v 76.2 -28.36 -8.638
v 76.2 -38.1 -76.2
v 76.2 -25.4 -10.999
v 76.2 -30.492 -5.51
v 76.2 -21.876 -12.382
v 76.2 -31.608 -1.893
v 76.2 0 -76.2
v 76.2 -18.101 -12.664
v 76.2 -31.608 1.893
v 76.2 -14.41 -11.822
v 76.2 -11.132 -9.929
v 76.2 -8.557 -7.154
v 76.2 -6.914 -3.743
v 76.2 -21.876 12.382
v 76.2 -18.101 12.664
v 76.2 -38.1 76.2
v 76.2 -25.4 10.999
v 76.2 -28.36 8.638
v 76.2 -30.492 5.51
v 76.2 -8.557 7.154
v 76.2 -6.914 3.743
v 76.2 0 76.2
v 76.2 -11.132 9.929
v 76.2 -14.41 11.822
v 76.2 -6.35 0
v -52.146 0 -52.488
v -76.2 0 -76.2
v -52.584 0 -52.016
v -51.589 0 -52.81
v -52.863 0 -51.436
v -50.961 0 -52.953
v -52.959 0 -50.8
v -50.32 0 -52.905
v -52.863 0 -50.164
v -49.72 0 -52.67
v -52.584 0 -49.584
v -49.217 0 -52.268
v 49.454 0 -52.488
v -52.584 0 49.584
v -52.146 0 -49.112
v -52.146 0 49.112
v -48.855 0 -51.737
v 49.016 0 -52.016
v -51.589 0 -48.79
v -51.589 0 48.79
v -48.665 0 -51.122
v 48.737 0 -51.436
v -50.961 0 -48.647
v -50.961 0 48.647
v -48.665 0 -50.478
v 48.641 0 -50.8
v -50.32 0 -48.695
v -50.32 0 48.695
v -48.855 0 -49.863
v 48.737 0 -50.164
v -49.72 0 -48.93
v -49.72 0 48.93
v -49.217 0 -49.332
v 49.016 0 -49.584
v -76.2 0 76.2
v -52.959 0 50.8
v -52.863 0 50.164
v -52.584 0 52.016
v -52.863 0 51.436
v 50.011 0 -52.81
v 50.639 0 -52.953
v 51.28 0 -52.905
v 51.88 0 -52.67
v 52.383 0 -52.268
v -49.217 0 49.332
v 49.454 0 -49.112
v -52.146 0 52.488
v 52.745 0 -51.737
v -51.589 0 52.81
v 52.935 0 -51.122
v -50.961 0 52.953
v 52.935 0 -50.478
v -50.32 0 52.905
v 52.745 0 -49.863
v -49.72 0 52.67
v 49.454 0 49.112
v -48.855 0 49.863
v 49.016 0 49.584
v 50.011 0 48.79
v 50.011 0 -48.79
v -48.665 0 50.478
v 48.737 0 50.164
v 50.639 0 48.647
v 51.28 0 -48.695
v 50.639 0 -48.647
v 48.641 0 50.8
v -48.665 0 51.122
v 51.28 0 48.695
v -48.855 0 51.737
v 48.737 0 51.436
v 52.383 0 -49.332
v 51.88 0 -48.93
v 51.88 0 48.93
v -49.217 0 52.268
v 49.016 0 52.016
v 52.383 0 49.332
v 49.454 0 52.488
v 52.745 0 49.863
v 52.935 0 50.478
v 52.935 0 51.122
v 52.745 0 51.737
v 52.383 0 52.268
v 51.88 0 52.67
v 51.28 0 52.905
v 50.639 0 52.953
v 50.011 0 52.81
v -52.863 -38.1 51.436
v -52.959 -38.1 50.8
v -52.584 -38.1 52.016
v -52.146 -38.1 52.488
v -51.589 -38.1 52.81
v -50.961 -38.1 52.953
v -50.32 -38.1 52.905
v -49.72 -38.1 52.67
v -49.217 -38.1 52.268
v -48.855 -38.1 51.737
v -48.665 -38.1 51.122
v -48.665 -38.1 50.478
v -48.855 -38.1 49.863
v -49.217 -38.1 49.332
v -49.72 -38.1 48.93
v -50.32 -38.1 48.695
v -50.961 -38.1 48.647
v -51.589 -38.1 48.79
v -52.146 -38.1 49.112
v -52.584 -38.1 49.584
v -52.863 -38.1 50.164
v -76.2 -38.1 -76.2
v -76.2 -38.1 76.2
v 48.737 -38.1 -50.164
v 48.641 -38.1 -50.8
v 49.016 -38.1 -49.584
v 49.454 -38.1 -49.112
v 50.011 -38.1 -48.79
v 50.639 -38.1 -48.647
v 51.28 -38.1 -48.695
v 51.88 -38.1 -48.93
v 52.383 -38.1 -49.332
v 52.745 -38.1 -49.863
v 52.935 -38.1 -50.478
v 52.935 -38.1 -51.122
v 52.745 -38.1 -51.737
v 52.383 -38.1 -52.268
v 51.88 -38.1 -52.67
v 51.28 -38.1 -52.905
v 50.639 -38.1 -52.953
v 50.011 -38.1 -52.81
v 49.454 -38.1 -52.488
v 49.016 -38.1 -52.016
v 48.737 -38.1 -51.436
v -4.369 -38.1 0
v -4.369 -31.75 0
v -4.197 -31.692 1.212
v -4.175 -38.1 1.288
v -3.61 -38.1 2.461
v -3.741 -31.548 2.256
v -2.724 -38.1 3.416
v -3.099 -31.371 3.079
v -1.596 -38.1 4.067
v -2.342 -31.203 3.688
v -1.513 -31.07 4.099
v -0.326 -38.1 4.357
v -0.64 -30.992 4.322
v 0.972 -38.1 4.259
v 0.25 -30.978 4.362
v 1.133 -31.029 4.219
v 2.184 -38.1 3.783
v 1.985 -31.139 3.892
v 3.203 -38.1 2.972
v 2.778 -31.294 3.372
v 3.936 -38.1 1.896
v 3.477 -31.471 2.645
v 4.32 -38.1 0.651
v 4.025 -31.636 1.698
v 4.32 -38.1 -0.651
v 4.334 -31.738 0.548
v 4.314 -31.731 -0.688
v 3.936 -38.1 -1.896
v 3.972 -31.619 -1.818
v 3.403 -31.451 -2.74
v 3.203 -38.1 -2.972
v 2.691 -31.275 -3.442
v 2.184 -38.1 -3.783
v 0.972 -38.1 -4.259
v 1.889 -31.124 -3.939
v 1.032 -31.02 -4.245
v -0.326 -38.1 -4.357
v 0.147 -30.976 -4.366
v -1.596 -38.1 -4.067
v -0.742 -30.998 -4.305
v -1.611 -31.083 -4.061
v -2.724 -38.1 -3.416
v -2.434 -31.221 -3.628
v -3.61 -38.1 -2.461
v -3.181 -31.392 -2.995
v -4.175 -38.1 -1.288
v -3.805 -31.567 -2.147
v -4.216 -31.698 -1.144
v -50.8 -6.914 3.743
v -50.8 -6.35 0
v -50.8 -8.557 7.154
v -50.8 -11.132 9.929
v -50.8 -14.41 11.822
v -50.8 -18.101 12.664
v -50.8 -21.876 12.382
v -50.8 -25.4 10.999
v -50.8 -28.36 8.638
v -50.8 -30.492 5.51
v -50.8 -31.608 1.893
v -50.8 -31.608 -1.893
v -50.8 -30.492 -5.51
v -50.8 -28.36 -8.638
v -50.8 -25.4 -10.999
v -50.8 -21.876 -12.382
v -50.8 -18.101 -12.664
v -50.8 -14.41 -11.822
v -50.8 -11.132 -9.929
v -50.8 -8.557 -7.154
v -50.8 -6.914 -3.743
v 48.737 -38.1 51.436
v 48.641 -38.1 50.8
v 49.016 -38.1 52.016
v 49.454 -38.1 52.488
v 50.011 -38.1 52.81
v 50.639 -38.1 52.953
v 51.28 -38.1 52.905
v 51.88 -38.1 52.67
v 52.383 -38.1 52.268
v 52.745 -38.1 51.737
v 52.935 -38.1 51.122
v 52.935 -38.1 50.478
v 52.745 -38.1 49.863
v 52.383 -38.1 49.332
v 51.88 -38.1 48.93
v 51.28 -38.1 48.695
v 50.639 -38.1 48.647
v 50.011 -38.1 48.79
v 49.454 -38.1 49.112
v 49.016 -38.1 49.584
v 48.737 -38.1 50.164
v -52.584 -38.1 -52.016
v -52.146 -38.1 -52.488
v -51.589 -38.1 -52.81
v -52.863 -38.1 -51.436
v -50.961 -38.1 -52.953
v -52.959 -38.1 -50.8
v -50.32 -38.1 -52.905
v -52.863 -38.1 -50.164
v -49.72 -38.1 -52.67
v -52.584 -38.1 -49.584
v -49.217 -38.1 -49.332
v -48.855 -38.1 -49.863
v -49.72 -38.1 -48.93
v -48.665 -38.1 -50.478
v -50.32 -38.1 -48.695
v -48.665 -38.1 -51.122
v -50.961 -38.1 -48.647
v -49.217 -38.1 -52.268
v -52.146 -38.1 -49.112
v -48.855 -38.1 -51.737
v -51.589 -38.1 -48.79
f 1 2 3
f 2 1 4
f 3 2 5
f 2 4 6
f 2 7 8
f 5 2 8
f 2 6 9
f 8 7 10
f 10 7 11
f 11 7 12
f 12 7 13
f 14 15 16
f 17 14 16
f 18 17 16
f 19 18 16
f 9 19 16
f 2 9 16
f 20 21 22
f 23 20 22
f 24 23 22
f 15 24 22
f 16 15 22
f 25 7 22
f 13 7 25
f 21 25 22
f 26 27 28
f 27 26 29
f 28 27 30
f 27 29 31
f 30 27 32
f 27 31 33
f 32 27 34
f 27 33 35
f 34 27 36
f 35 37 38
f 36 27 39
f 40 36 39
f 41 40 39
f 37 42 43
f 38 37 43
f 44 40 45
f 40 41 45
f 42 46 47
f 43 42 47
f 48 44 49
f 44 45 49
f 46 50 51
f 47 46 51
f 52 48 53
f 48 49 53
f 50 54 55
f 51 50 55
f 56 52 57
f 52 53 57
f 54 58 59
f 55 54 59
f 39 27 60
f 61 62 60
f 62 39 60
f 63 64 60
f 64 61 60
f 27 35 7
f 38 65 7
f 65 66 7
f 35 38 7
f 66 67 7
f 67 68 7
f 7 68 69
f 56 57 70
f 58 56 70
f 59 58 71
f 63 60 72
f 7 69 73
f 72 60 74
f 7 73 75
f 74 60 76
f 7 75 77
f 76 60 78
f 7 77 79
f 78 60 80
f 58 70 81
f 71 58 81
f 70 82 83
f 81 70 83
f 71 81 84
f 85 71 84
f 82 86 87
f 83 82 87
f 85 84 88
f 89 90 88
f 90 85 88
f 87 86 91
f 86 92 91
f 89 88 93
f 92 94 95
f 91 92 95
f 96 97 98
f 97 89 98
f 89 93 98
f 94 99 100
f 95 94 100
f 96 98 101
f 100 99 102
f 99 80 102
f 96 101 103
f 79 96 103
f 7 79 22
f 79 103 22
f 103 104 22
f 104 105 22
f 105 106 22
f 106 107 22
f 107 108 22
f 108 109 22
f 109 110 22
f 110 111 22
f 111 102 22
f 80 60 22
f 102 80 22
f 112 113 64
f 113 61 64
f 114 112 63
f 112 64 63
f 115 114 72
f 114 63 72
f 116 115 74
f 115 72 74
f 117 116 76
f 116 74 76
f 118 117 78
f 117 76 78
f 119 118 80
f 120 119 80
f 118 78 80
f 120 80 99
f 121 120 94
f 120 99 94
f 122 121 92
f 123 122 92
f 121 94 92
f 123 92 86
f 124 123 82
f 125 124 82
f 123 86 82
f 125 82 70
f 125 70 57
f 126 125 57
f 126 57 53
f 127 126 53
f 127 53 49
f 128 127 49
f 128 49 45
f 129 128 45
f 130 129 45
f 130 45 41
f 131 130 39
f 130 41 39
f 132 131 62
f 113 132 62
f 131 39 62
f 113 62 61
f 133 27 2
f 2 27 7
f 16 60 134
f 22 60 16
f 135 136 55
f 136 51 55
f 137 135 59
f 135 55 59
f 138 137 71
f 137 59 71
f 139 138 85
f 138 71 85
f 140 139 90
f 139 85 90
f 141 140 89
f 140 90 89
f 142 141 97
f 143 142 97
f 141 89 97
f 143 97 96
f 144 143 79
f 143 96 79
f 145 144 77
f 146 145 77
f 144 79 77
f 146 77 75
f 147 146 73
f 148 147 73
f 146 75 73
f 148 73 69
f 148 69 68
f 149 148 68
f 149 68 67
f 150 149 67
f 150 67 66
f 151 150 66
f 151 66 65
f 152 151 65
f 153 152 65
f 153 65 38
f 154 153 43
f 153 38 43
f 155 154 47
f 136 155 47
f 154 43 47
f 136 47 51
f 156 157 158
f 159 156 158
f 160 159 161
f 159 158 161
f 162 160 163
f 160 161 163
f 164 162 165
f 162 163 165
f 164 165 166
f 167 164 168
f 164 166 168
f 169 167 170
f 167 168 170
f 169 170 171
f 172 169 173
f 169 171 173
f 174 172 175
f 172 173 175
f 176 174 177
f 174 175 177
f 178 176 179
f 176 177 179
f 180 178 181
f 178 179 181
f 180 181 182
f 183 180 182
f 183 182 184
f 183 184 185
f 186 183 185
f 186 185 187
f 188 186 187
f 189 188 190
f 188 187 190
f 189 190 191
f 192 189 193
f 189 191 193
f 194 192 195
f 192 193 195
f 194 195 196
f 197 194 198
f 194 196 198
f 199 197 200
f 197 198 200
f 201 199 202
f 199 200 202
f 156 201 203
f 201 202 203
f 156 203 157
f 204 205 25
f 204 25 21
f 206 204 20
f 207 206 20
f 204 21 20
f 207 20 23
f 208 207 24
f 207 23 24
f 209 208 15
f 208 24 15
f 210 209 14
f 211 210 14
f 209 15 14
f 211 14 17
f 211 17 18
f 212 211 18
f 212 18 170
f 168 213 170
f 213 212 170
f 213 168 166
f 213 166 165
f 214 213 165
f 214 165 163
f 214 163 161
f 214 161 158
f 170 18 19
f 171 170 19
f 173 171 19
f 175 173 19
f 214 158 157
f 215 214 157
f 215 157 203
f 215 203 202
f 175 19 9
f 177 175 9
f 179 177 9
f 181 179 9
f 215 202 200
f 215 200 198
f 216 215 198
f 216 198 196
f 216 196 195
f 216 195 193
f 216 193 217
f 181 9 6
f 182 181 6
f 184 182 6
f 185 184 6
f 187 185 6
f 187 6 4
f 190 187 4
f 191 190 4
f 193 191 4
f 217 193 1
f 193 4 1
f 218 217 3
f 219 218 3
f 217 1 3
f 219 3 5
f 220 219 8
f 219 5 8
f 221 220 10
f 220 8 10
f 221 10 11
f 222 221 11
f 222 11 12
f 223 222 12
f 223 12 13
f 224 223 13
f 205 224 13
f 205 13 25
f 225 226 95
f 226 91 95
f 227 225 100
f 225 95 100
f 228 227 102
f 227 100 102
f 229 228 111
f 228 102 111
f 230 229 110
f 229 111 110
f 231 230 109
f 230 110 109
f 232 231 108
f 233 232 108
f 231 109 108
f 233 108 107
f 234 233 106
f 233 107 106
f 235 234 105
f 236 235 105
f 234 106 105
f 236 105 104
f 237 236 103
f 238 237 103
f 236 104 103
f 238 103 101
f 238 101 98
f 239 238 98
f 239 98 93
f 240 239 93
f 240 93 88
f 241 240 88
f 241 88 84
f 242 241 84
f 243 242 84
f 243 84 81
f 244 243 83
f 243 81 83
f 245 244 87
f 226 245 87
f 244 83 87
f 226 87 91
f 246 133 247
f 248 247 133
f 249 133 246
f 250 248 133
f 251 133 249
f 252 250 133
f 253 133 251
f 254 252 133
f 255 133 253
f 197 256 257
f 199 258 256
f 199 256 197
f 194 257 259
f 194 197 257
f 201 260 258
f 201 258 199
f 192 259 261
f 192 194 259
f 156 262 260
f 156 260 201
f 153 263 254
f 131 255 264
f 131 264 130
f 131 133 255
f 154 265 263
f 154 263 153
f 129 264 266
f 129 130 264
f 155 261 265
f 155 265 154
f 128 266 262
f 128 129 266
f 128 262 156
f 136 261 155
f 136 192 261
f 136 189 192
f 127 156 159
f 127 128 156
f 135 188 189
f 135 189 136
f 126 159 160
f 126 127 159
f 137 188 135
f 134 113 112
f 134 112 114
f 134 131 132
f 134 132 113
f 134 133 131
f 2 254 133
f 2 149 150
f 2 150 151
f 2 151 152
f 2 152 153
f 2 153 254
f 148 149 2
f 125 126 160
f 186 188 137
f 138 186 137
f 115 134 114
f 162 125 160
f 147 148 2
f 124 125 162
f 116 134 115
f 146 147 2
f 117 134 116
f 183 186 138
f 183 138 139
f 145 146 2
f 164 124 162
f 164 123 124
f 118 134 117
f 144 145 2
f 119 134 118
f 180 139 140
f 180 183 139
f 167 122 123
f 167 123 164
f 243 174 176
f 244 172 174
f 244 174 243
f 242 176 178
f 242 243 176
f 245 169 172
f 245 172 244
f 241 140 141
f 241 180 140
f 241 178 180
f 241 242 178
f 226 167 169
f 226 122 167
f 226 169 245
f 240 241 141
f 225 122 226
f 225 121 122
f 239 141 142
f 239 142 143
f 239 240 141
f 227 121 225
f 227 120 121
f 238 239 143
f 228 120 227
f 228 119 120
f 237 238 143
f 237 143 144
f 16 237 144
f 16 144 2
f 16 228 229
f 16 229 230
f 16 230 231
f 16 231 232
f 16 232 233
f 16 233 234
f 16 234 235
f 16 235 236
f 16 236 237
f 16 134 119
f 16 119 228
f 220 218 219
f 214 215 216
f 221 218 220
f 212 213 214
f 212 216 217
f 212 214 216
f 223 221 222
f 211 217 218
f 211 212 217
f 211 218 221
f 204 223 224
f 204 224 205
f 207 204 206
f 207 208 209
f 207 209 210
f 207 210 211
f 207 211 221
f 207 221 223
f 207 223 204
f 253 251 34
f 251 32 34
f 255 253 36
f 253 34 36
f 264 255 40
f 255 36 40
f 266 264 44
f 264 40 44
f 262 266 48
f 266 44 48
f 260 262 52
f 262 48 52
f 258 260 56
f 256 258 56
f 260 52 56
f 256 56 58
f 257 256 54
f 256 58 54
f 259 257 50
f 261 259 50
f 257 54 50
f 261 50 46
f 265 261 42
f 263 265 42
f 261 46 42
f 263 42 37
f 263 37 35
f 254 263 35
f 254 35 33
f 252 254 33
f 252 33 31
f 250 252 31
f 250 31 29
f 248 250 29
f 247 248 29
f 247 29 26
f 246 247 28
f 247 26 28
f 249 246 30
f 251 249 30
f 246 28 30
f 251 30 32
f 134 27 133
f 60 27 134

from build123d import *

# Parameters (mm, degrees)
F0_W     = 152.4
F0_H     = 152.4
F1_DEPTH = 38.1
F4_D     = 8.7376
F4_DEPTH = 12.7
F4_TIP   = 2.6250398724
F2_R     = 12.7
F5_DEPTH = 127
F7_D     = 4.318
F7_DEPTH = 38.1
F7_TIP   = 1.2972580765


with BuildPart() as f1:
    # F0 (on Front) → F1 (new body)
    with BuildSketch(Plane.XZ):
        Rectangle(F0_W, F0_H)
    extrude(amount=F1_DEPTH)

    # F4
    with Locations(Plane.XZ.offset(38.1)):
        with Locations((0, 0)):
            Hole(F4_D / 2, depth=F4_DEPTH)
            with Locations((0, 0, -(F4_DEPTH + F4_TIP / 2))):  # 118° drill point
                Cone(0, F4_D / 2, F4_TIP, mode=Mode.SUBTRACT)

    # F2 (on face) → F5 (cut)
    with BuildSketch(Plane.YZ.offset(76.2)):
        with Locations((-19.05, 0)):
            Circle(F2_R)
    extrude(amount=-F5_DEPTH, mode=Mode.SUBTRACT)

    # F7
    with Locations(Plane.XZ.offset(38.1)):
        with Locations((-50.8, 50.8), (50.8, 50.8), (-50.8, -50.8), (50.8, -50.8)):
            Hole(F7_D / 2, depth=F7_DEPTH)
            with Locations((0, 0, -(F7_DEPTH + F7_TIP / 2))):  # 118° drill point
                Cone(0, F7_D / 2, F7_TIP, mode=Mode.SUBTRACT)


solid = f1.part
